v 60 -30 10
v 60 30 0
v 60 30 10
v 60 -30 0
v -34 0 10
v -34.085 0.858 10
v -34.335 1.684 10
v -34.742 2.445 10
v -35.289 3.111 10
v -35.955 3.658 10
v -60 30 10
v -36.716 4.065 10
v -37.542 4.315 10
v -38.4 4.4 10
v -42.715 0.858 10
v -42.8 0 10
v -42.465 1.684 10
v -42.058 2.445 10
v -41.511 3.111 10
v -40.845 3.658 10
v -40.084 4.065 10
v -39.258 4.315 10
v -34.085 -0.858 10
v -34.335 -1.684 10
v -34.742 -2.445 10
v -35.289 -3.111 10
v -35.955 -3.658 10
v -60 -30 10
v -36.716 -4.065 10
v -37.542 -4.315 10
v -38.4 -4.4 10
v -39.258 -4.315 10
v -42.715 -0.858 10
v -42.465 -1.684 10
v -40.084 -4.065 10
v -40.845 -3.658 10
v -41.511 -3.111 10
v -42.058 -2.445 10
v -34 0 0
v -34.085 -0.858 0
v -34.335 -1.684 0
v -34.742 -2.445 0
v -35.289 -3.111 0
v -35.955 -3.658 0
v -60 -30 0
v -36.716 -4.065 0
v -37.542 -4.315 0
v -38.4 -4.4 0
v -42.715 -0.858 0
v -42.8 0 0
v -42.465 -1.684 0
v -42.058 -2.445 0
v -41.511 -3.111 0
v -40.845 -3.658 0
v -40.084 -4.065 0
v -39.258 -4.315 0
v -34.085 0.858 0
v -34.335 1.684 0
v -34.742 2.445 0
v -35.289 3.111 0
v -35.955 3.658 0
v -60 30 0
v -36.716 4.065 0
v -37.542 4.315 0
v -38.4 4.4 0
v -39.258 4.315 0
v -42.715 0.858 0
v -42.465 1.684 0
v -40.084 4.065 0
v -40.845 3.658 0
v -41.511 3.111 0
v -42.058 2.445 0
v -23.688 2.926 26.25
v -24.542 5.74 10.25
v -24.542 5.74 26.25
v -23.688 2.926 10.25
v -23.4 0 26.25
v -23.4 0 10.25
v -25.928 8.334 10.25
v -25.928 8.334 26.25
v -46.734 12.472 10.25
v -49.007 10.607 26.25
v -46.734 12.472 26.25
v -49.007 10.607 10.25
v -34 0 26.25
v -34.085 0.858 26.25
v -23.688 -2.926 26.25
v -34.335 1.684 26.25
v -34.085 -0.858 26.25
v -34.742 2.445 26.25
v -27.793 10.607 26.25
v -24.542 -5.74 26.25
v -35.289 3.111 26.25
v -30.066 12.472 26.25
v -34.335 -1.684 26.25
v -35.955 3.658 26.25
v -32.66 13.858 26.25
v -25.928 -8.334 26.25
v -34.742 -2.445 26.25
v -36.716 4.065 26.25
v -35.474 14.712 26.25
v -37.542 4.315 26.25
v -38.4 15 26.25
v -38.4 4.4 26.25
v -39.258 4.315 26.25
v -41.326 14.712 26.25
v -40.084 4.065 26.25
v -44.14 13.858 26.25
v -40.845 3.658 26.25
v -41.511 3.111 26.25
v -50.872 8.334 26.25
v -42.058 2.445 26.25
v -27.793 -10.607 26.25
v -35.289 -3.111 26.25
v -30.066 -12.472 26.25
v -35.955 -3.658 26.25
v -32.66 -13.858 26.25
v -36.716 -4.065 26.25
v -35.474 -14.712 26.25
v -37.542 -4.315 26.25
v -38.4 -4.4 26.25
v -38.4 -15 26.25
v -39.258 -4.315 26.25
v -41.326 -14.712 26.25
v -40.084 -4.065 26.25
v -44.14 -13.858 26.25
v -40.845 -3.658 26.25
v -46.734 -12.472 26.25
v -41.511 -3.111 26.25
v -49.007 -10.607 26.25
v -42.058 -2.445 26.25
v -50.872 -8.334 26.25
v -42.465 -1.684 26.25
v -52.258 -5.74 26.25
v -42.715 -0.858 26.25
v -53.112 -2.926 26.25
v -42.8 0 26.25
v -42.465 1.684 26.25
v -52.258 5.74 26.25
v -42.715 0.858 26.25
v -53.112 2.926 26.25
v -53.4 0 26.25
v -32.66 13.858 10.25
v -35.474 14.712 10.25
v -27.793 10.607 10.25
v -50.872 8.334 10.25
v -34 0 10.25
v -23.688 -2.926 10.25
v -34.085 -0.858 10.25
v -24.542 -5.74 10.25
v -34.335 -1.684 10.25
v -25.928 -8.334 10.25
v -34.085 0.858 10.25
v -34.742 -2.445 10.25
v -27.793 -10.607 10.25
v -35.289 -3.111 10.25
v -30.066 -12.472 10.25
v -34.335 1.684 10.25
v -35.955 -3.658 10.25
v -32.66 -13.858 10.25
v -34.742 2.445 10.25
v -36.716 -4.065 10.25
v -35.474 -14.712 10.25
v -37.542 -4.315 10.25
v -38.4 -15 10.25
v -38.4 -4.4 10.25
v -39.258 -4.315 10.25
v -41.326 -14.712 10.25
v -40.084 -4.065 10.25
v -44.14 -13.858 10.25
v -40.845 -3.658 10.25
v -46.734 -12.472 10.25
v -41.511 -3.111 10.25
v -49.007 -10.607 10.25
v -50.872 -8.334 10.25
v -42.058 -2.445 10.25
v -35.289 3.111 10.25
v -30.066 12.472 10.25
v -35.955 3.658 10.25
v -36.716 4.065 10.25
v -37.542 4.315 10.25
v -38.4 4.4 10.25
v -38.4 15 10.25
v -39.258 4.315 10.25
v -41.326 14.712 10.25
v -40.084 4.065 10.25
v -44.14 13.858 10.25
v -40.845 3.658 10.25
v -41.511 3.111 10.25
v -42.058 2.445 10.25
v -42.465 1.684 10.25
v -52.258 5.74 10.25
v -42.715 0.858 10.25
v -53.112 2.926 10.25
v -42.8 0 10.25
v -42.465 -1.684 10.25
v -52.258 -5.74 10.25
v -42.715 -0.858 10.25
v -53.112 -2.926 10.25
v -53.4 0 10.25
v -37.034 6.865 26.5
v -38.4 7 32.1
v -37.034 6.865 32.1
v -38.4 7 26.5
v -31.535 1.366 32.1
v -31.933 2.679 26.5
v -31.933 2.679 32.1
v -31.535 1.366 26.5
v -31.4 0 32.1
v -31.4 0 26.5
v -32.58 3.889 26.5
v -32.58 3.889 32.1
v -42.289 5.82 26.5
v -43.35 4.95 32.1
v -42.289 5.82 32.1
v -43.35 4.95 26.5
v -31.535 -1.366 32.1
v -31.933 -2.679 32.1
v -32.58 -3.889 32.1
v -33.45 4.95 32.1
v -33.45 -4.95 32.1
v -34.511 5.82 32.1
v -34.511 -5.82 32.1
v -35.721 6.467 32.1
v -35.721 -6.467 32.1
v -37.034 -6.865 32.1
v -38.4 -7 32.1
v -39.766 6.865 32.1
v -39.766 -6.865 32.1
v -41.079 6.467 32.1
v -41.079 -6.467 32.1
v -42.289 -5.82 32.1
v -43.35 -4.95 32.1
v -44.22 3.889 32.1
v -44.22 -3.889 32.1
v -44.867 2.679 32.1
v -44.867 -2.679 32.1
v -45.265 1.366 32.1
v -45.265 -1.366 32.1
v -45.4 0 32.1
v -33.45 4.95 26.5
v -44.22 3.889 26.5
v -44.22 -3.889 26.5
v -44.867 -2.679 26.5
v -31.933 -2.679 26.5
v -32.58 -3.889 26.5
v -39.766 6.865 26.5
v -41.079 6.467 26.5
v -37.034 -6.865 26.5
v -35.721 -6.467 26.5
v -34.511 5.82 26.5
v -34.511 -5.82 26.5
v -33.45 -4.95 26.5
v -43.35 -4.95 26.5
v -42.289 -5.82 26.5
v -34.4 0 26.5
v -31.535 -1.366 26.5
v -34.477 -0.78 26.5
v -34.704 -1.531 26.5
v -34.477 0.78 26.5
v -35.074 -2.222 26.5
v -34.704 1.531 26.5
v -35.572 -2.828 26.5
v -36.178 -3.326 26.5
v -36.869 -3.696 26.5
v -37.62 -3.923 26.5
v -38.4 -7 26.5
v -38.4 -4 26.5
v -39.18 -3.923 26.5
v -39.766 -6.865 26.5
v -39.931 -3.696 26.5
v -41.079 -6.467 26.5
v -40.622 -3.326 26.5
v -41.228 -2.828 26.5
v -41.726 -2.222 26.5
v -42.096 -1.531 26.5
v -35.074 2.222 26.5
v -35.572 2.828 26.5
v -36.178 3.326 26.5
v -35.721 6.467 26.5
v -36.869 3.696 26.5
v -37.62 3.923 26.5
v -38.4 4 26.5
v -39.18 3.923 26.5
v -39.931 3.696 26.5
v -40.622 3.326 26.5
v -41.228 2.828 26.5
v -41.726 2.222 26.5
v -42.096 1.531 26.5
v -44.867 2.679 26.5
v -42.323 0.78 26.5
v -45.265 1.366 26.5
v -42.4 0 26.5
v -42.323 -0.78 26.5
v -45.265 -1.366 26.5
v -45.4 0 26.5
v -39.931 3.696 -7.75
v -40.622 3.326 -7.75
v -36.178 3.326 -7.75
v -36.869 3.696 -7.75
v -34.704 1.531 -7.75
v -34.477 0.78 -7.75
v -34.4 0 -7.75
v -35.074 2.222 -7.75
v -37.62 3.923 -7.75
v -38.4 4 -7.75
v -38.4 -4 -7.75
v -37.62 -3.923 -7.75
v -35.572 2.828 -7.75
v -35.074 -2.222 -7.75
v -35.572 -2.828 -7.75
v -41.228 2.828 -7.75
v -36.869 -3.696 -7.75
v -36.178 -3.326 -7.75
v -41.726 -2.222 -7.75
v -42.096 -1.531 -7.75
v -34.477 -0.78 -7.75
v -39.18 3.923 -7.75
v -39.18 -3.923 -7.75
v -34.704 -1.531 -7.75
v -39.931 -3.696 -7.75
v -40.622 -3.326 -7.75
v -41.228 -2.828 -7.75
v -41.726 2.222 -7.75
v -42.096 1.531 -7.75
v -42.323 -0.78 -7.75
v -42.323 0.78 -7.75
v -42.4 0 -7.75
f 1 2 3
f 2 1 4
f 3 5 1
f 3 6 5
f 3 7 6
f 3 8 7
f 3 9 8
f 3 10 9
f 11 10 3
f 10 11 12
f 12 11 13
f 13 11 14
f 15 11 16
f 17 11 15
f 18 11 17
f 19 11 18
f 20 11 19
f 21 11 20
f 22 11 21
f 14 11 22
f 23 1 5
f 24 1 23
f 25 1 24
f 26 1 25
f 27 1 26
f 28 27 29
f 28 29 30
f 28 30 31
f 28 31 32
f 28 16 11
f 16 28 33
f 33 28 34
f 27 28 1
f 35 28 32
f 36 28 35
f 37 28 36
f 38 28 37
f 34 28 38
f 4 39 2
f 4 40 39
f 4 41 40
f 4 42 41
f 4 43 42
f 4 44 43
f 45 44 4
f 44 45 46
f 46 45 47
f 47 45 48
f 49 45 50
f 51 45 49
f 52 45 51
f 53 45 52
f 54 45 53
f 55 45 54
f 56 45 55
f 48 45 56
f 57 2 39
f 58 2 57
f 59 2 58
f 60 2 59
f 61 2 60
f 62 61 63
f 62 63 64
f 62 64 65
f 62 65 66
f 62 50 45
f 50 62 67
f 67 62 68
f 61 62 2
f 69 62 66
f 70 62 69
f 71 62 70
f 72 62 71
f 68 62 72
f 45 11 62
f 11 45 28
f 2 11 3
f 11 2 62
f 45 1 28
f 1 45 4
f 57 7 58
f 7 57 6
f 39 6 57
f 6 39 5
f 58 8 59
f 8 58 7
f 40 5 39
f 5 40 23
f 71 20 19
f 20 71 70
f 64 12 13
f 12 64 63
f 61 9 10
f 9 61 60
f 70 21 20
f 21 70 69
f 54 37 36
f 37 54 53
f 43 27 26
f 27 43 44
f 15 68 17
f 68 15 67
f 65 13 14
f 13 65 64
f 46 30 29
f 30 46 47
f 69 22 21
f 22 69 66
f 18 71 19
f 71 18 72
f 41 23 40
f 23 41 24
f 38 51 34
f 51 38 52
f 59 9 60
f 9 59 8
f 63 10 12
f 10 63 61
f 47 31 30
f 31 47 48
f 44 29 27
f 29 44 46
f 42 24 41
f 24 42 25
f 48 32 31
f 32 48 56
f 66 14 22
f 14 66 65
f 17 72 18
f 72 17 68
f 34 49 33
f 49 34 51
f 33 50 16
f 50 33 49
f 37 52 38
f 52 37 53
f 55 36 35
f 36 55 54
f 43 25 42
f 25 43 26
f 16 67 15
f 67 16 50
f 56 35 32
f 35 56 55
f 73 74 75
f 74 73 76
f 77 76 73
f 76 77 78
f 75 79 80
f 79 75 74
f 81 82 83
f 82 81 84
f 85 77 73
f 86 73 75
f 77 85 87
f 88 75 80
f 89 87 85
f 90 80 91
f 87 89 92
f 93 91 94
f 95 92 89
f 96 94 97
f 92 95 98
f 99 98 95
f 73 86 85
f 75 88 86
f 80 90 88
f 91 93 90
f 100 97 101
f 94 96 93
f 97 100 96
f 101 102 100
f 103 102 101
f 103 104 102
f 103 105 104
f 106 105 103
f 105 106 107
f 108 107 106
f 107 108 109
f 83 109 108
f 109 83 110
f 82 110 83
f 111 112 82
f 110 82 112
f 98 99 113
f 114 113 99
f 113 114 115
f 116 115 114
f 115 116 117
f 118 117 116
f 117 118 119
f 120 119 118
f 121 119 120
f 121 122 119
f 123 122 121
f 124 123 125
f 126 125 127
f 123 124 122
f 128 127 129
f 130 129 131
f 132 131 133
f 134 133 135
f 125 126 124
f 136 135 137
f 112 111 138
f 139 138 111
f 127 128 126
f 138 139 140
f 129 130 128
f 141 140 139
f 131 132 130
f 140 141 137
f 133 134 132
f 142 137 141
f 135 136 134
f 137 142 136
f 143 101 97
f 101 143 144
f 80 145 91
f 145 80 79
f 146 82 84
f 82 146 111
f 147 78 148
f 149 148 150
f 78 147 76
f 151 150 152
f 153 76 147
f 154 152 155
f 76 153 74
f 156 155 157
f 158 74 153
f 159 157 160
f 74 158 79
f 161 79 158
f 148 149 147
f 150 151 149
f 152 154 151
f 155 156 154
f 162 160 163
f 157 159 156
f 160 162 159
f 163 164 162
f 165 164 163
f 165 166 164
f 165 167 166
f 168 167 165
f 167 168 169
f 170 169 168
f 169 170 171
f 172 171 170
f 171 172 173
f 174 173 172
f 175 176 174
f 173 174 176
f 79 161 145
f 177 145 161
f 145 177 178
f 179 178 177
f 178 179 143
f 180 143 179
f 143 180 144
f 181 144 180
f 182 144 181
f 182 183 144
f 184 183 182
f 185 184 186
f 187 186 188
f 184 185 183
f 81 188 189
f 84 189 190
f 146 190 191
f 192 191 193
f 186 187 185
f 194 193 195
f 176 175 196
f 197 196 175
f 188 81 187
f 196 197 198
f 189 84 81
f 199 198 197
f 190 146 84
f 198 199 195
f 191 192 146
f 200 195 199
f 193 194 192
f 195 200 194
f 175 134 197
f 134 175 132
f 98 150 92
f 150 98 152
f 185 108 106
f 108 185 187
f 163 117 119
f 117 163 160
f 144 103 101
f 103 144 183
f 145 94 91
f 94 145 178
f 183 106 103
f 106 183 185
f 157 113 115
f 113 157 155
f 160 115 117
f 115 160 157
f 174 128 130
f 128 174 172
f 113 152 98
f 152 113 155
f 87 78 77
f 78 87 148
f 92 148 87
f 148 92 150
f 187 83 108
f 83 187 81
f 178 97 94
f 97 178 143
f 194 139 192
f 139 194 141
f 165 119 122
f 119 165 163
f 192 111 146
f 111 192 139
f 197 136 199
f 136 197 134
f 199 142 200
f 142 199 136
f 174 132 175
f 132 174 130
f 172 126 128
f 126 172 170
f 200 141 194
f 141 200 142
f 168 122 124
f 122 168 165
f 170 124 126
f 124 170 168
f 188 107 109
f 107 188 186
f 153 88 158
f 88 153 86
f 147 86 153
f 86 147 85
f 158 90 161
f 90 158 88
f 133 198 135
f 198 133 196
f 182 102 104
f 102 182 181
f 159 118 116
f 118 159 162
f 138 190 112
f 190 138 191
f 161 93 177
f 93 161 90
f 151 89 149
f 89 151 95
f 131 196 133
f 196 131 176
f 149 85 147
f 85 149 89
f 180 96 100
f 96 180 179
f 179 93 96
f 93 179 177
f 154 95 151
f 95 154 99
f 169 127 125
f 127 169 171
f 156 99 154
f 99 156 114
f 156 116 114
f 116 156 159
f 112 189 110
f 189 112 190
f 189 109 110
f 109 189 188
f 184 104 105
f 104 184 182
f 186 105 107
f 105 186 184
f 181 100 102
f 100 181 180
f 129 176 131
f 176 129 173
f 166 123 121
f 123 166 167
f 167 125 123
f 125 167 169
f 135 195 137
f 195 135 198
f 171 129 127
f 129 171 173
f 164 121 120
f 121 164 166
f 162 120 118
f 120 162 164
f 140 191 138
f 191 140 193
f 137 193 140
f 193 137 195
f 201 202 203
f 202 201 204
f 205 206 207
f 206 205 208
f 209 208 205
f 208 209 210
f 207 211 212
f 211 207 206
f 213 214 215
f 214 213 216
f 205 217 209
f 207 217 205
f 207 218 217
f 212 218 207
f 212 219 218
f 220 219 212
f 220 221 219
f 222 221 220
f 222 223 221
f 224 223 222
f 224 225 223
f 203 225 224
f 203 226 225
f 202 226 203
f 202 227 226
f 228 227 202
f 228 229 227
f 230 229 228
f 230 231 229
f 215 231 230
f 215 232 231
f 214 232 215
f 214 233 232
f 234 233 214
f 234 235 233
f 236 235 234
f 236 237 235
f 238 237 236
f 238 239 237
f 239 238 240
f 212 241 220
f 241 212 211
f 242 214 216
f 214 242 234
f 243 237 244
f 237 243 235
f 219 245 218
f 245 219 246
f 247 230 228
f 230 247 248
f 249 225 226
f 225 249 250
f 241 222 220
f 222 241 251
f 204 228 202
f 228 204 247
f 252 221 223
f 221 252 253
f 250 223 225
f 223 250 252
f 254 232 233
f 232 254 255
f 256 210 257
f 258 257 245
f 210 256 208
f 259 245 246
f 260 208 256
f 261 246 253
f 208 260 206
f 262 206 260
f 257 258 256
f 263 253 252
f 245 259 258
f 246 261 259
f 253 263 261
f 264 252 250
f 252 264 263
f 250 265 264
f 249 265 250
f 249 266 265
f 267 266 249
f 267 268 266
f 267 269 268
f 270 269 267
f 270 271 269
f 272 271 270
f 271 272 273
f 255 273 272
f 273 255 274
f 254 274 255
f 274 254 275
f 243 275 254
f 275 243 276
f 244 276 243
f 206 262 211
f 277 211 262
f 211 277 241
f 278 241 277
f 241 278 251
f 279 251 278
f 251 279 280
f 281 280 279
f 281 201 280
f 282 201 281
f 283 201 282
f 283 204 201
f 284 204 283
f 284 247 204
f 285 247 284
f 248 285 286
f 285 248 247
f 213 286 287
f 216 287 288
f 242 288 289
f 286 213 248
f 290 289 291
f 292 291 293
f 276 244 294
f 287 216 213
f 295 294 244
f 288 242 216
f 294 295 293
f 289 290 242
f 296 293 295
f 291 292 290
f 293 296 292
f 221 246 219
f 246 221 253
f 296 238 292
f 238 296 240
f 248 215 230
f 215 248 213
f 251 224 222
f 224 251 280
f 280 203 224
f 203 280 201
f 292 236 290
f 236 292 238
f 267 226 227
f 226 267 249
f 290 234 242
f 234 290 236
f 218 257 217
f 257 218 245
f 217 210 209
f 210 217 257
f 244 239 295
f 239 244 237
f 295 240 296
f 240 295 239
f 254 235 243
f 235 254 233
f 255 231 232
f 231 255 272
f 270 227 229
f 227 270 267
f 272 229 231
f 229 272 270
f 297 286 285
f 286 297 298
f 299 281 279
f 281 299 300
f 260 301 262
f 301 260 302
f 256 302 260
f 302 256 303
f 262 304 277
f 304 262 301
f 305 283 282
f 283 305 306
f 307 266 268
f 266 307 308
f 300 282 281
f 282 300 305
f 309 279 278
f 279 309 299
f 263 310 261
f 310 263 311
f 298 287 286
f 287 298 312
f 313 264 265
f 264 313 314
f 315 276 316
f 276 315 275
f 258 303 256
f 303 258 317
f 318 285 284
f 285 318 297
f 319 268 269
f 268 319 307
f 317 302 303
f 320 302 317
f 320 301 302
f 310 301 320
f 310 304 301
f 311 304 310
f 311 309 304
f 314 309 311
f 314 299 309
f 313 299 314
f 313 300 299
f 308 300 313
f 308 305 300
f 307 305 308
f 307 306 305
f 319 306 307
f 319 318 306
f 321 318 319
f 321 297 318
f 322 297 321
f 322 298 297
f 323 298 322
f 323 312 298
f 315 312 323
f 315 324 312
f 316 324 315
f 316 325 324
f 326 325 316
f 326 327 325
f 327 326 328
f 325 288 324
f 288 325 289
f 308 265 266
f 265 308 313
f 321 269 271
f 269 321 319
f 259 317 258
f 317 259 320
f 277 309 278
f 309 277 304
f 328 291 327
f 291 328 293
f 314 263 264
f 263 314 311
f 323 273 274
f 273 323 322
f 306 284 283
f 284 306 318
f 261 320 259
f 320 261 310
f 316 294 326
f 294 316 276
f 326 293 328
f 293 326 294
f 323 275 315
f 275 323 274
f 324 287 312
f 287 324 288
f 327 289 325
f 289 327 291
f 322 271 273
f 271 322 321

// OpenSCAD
$fn = 32;

// ------------------------------------------------------------------------
// Standoff columns: 1 d30 standoffs, bolts d8
// Every part is its own module, assembly() places them once.
// ------------------------------------------------------------------------

// --- part 1 ---
module base_plate() {
  difference() {
    translate([-60, -30, 0]) cube([120, 60, 10]);
    translate([-38.4, 0, -1]) cylinder(h = 12, d = 8.8);
  }
}

// --- part 2 ---
module spacer() {
  difference() {
      translate([0, 0, 0]) cylinder(h = 16, d = 30);
      translate([0, 0, -1]) cylinder(h = 18, d = 8.8);
    }
}

// --- part 3 ---
module bolt() {
  cylinder(h = 5.6, d = 14);
  translate([0, 0, -34.25]) cylinder(h = 34.25, d = 8);
}

// --- assembly ---
module assembly() {
  translate([0, 0, 0]) rotate([0, 0, 0]) base_plate();
  translate([-38.4, 0, 10.25]) rotate([0, 0, 0]) spacer();
  translate([-38.4, 0, 26.5]) rotate([0, 0, 0]) bolt();
}

assembly();
